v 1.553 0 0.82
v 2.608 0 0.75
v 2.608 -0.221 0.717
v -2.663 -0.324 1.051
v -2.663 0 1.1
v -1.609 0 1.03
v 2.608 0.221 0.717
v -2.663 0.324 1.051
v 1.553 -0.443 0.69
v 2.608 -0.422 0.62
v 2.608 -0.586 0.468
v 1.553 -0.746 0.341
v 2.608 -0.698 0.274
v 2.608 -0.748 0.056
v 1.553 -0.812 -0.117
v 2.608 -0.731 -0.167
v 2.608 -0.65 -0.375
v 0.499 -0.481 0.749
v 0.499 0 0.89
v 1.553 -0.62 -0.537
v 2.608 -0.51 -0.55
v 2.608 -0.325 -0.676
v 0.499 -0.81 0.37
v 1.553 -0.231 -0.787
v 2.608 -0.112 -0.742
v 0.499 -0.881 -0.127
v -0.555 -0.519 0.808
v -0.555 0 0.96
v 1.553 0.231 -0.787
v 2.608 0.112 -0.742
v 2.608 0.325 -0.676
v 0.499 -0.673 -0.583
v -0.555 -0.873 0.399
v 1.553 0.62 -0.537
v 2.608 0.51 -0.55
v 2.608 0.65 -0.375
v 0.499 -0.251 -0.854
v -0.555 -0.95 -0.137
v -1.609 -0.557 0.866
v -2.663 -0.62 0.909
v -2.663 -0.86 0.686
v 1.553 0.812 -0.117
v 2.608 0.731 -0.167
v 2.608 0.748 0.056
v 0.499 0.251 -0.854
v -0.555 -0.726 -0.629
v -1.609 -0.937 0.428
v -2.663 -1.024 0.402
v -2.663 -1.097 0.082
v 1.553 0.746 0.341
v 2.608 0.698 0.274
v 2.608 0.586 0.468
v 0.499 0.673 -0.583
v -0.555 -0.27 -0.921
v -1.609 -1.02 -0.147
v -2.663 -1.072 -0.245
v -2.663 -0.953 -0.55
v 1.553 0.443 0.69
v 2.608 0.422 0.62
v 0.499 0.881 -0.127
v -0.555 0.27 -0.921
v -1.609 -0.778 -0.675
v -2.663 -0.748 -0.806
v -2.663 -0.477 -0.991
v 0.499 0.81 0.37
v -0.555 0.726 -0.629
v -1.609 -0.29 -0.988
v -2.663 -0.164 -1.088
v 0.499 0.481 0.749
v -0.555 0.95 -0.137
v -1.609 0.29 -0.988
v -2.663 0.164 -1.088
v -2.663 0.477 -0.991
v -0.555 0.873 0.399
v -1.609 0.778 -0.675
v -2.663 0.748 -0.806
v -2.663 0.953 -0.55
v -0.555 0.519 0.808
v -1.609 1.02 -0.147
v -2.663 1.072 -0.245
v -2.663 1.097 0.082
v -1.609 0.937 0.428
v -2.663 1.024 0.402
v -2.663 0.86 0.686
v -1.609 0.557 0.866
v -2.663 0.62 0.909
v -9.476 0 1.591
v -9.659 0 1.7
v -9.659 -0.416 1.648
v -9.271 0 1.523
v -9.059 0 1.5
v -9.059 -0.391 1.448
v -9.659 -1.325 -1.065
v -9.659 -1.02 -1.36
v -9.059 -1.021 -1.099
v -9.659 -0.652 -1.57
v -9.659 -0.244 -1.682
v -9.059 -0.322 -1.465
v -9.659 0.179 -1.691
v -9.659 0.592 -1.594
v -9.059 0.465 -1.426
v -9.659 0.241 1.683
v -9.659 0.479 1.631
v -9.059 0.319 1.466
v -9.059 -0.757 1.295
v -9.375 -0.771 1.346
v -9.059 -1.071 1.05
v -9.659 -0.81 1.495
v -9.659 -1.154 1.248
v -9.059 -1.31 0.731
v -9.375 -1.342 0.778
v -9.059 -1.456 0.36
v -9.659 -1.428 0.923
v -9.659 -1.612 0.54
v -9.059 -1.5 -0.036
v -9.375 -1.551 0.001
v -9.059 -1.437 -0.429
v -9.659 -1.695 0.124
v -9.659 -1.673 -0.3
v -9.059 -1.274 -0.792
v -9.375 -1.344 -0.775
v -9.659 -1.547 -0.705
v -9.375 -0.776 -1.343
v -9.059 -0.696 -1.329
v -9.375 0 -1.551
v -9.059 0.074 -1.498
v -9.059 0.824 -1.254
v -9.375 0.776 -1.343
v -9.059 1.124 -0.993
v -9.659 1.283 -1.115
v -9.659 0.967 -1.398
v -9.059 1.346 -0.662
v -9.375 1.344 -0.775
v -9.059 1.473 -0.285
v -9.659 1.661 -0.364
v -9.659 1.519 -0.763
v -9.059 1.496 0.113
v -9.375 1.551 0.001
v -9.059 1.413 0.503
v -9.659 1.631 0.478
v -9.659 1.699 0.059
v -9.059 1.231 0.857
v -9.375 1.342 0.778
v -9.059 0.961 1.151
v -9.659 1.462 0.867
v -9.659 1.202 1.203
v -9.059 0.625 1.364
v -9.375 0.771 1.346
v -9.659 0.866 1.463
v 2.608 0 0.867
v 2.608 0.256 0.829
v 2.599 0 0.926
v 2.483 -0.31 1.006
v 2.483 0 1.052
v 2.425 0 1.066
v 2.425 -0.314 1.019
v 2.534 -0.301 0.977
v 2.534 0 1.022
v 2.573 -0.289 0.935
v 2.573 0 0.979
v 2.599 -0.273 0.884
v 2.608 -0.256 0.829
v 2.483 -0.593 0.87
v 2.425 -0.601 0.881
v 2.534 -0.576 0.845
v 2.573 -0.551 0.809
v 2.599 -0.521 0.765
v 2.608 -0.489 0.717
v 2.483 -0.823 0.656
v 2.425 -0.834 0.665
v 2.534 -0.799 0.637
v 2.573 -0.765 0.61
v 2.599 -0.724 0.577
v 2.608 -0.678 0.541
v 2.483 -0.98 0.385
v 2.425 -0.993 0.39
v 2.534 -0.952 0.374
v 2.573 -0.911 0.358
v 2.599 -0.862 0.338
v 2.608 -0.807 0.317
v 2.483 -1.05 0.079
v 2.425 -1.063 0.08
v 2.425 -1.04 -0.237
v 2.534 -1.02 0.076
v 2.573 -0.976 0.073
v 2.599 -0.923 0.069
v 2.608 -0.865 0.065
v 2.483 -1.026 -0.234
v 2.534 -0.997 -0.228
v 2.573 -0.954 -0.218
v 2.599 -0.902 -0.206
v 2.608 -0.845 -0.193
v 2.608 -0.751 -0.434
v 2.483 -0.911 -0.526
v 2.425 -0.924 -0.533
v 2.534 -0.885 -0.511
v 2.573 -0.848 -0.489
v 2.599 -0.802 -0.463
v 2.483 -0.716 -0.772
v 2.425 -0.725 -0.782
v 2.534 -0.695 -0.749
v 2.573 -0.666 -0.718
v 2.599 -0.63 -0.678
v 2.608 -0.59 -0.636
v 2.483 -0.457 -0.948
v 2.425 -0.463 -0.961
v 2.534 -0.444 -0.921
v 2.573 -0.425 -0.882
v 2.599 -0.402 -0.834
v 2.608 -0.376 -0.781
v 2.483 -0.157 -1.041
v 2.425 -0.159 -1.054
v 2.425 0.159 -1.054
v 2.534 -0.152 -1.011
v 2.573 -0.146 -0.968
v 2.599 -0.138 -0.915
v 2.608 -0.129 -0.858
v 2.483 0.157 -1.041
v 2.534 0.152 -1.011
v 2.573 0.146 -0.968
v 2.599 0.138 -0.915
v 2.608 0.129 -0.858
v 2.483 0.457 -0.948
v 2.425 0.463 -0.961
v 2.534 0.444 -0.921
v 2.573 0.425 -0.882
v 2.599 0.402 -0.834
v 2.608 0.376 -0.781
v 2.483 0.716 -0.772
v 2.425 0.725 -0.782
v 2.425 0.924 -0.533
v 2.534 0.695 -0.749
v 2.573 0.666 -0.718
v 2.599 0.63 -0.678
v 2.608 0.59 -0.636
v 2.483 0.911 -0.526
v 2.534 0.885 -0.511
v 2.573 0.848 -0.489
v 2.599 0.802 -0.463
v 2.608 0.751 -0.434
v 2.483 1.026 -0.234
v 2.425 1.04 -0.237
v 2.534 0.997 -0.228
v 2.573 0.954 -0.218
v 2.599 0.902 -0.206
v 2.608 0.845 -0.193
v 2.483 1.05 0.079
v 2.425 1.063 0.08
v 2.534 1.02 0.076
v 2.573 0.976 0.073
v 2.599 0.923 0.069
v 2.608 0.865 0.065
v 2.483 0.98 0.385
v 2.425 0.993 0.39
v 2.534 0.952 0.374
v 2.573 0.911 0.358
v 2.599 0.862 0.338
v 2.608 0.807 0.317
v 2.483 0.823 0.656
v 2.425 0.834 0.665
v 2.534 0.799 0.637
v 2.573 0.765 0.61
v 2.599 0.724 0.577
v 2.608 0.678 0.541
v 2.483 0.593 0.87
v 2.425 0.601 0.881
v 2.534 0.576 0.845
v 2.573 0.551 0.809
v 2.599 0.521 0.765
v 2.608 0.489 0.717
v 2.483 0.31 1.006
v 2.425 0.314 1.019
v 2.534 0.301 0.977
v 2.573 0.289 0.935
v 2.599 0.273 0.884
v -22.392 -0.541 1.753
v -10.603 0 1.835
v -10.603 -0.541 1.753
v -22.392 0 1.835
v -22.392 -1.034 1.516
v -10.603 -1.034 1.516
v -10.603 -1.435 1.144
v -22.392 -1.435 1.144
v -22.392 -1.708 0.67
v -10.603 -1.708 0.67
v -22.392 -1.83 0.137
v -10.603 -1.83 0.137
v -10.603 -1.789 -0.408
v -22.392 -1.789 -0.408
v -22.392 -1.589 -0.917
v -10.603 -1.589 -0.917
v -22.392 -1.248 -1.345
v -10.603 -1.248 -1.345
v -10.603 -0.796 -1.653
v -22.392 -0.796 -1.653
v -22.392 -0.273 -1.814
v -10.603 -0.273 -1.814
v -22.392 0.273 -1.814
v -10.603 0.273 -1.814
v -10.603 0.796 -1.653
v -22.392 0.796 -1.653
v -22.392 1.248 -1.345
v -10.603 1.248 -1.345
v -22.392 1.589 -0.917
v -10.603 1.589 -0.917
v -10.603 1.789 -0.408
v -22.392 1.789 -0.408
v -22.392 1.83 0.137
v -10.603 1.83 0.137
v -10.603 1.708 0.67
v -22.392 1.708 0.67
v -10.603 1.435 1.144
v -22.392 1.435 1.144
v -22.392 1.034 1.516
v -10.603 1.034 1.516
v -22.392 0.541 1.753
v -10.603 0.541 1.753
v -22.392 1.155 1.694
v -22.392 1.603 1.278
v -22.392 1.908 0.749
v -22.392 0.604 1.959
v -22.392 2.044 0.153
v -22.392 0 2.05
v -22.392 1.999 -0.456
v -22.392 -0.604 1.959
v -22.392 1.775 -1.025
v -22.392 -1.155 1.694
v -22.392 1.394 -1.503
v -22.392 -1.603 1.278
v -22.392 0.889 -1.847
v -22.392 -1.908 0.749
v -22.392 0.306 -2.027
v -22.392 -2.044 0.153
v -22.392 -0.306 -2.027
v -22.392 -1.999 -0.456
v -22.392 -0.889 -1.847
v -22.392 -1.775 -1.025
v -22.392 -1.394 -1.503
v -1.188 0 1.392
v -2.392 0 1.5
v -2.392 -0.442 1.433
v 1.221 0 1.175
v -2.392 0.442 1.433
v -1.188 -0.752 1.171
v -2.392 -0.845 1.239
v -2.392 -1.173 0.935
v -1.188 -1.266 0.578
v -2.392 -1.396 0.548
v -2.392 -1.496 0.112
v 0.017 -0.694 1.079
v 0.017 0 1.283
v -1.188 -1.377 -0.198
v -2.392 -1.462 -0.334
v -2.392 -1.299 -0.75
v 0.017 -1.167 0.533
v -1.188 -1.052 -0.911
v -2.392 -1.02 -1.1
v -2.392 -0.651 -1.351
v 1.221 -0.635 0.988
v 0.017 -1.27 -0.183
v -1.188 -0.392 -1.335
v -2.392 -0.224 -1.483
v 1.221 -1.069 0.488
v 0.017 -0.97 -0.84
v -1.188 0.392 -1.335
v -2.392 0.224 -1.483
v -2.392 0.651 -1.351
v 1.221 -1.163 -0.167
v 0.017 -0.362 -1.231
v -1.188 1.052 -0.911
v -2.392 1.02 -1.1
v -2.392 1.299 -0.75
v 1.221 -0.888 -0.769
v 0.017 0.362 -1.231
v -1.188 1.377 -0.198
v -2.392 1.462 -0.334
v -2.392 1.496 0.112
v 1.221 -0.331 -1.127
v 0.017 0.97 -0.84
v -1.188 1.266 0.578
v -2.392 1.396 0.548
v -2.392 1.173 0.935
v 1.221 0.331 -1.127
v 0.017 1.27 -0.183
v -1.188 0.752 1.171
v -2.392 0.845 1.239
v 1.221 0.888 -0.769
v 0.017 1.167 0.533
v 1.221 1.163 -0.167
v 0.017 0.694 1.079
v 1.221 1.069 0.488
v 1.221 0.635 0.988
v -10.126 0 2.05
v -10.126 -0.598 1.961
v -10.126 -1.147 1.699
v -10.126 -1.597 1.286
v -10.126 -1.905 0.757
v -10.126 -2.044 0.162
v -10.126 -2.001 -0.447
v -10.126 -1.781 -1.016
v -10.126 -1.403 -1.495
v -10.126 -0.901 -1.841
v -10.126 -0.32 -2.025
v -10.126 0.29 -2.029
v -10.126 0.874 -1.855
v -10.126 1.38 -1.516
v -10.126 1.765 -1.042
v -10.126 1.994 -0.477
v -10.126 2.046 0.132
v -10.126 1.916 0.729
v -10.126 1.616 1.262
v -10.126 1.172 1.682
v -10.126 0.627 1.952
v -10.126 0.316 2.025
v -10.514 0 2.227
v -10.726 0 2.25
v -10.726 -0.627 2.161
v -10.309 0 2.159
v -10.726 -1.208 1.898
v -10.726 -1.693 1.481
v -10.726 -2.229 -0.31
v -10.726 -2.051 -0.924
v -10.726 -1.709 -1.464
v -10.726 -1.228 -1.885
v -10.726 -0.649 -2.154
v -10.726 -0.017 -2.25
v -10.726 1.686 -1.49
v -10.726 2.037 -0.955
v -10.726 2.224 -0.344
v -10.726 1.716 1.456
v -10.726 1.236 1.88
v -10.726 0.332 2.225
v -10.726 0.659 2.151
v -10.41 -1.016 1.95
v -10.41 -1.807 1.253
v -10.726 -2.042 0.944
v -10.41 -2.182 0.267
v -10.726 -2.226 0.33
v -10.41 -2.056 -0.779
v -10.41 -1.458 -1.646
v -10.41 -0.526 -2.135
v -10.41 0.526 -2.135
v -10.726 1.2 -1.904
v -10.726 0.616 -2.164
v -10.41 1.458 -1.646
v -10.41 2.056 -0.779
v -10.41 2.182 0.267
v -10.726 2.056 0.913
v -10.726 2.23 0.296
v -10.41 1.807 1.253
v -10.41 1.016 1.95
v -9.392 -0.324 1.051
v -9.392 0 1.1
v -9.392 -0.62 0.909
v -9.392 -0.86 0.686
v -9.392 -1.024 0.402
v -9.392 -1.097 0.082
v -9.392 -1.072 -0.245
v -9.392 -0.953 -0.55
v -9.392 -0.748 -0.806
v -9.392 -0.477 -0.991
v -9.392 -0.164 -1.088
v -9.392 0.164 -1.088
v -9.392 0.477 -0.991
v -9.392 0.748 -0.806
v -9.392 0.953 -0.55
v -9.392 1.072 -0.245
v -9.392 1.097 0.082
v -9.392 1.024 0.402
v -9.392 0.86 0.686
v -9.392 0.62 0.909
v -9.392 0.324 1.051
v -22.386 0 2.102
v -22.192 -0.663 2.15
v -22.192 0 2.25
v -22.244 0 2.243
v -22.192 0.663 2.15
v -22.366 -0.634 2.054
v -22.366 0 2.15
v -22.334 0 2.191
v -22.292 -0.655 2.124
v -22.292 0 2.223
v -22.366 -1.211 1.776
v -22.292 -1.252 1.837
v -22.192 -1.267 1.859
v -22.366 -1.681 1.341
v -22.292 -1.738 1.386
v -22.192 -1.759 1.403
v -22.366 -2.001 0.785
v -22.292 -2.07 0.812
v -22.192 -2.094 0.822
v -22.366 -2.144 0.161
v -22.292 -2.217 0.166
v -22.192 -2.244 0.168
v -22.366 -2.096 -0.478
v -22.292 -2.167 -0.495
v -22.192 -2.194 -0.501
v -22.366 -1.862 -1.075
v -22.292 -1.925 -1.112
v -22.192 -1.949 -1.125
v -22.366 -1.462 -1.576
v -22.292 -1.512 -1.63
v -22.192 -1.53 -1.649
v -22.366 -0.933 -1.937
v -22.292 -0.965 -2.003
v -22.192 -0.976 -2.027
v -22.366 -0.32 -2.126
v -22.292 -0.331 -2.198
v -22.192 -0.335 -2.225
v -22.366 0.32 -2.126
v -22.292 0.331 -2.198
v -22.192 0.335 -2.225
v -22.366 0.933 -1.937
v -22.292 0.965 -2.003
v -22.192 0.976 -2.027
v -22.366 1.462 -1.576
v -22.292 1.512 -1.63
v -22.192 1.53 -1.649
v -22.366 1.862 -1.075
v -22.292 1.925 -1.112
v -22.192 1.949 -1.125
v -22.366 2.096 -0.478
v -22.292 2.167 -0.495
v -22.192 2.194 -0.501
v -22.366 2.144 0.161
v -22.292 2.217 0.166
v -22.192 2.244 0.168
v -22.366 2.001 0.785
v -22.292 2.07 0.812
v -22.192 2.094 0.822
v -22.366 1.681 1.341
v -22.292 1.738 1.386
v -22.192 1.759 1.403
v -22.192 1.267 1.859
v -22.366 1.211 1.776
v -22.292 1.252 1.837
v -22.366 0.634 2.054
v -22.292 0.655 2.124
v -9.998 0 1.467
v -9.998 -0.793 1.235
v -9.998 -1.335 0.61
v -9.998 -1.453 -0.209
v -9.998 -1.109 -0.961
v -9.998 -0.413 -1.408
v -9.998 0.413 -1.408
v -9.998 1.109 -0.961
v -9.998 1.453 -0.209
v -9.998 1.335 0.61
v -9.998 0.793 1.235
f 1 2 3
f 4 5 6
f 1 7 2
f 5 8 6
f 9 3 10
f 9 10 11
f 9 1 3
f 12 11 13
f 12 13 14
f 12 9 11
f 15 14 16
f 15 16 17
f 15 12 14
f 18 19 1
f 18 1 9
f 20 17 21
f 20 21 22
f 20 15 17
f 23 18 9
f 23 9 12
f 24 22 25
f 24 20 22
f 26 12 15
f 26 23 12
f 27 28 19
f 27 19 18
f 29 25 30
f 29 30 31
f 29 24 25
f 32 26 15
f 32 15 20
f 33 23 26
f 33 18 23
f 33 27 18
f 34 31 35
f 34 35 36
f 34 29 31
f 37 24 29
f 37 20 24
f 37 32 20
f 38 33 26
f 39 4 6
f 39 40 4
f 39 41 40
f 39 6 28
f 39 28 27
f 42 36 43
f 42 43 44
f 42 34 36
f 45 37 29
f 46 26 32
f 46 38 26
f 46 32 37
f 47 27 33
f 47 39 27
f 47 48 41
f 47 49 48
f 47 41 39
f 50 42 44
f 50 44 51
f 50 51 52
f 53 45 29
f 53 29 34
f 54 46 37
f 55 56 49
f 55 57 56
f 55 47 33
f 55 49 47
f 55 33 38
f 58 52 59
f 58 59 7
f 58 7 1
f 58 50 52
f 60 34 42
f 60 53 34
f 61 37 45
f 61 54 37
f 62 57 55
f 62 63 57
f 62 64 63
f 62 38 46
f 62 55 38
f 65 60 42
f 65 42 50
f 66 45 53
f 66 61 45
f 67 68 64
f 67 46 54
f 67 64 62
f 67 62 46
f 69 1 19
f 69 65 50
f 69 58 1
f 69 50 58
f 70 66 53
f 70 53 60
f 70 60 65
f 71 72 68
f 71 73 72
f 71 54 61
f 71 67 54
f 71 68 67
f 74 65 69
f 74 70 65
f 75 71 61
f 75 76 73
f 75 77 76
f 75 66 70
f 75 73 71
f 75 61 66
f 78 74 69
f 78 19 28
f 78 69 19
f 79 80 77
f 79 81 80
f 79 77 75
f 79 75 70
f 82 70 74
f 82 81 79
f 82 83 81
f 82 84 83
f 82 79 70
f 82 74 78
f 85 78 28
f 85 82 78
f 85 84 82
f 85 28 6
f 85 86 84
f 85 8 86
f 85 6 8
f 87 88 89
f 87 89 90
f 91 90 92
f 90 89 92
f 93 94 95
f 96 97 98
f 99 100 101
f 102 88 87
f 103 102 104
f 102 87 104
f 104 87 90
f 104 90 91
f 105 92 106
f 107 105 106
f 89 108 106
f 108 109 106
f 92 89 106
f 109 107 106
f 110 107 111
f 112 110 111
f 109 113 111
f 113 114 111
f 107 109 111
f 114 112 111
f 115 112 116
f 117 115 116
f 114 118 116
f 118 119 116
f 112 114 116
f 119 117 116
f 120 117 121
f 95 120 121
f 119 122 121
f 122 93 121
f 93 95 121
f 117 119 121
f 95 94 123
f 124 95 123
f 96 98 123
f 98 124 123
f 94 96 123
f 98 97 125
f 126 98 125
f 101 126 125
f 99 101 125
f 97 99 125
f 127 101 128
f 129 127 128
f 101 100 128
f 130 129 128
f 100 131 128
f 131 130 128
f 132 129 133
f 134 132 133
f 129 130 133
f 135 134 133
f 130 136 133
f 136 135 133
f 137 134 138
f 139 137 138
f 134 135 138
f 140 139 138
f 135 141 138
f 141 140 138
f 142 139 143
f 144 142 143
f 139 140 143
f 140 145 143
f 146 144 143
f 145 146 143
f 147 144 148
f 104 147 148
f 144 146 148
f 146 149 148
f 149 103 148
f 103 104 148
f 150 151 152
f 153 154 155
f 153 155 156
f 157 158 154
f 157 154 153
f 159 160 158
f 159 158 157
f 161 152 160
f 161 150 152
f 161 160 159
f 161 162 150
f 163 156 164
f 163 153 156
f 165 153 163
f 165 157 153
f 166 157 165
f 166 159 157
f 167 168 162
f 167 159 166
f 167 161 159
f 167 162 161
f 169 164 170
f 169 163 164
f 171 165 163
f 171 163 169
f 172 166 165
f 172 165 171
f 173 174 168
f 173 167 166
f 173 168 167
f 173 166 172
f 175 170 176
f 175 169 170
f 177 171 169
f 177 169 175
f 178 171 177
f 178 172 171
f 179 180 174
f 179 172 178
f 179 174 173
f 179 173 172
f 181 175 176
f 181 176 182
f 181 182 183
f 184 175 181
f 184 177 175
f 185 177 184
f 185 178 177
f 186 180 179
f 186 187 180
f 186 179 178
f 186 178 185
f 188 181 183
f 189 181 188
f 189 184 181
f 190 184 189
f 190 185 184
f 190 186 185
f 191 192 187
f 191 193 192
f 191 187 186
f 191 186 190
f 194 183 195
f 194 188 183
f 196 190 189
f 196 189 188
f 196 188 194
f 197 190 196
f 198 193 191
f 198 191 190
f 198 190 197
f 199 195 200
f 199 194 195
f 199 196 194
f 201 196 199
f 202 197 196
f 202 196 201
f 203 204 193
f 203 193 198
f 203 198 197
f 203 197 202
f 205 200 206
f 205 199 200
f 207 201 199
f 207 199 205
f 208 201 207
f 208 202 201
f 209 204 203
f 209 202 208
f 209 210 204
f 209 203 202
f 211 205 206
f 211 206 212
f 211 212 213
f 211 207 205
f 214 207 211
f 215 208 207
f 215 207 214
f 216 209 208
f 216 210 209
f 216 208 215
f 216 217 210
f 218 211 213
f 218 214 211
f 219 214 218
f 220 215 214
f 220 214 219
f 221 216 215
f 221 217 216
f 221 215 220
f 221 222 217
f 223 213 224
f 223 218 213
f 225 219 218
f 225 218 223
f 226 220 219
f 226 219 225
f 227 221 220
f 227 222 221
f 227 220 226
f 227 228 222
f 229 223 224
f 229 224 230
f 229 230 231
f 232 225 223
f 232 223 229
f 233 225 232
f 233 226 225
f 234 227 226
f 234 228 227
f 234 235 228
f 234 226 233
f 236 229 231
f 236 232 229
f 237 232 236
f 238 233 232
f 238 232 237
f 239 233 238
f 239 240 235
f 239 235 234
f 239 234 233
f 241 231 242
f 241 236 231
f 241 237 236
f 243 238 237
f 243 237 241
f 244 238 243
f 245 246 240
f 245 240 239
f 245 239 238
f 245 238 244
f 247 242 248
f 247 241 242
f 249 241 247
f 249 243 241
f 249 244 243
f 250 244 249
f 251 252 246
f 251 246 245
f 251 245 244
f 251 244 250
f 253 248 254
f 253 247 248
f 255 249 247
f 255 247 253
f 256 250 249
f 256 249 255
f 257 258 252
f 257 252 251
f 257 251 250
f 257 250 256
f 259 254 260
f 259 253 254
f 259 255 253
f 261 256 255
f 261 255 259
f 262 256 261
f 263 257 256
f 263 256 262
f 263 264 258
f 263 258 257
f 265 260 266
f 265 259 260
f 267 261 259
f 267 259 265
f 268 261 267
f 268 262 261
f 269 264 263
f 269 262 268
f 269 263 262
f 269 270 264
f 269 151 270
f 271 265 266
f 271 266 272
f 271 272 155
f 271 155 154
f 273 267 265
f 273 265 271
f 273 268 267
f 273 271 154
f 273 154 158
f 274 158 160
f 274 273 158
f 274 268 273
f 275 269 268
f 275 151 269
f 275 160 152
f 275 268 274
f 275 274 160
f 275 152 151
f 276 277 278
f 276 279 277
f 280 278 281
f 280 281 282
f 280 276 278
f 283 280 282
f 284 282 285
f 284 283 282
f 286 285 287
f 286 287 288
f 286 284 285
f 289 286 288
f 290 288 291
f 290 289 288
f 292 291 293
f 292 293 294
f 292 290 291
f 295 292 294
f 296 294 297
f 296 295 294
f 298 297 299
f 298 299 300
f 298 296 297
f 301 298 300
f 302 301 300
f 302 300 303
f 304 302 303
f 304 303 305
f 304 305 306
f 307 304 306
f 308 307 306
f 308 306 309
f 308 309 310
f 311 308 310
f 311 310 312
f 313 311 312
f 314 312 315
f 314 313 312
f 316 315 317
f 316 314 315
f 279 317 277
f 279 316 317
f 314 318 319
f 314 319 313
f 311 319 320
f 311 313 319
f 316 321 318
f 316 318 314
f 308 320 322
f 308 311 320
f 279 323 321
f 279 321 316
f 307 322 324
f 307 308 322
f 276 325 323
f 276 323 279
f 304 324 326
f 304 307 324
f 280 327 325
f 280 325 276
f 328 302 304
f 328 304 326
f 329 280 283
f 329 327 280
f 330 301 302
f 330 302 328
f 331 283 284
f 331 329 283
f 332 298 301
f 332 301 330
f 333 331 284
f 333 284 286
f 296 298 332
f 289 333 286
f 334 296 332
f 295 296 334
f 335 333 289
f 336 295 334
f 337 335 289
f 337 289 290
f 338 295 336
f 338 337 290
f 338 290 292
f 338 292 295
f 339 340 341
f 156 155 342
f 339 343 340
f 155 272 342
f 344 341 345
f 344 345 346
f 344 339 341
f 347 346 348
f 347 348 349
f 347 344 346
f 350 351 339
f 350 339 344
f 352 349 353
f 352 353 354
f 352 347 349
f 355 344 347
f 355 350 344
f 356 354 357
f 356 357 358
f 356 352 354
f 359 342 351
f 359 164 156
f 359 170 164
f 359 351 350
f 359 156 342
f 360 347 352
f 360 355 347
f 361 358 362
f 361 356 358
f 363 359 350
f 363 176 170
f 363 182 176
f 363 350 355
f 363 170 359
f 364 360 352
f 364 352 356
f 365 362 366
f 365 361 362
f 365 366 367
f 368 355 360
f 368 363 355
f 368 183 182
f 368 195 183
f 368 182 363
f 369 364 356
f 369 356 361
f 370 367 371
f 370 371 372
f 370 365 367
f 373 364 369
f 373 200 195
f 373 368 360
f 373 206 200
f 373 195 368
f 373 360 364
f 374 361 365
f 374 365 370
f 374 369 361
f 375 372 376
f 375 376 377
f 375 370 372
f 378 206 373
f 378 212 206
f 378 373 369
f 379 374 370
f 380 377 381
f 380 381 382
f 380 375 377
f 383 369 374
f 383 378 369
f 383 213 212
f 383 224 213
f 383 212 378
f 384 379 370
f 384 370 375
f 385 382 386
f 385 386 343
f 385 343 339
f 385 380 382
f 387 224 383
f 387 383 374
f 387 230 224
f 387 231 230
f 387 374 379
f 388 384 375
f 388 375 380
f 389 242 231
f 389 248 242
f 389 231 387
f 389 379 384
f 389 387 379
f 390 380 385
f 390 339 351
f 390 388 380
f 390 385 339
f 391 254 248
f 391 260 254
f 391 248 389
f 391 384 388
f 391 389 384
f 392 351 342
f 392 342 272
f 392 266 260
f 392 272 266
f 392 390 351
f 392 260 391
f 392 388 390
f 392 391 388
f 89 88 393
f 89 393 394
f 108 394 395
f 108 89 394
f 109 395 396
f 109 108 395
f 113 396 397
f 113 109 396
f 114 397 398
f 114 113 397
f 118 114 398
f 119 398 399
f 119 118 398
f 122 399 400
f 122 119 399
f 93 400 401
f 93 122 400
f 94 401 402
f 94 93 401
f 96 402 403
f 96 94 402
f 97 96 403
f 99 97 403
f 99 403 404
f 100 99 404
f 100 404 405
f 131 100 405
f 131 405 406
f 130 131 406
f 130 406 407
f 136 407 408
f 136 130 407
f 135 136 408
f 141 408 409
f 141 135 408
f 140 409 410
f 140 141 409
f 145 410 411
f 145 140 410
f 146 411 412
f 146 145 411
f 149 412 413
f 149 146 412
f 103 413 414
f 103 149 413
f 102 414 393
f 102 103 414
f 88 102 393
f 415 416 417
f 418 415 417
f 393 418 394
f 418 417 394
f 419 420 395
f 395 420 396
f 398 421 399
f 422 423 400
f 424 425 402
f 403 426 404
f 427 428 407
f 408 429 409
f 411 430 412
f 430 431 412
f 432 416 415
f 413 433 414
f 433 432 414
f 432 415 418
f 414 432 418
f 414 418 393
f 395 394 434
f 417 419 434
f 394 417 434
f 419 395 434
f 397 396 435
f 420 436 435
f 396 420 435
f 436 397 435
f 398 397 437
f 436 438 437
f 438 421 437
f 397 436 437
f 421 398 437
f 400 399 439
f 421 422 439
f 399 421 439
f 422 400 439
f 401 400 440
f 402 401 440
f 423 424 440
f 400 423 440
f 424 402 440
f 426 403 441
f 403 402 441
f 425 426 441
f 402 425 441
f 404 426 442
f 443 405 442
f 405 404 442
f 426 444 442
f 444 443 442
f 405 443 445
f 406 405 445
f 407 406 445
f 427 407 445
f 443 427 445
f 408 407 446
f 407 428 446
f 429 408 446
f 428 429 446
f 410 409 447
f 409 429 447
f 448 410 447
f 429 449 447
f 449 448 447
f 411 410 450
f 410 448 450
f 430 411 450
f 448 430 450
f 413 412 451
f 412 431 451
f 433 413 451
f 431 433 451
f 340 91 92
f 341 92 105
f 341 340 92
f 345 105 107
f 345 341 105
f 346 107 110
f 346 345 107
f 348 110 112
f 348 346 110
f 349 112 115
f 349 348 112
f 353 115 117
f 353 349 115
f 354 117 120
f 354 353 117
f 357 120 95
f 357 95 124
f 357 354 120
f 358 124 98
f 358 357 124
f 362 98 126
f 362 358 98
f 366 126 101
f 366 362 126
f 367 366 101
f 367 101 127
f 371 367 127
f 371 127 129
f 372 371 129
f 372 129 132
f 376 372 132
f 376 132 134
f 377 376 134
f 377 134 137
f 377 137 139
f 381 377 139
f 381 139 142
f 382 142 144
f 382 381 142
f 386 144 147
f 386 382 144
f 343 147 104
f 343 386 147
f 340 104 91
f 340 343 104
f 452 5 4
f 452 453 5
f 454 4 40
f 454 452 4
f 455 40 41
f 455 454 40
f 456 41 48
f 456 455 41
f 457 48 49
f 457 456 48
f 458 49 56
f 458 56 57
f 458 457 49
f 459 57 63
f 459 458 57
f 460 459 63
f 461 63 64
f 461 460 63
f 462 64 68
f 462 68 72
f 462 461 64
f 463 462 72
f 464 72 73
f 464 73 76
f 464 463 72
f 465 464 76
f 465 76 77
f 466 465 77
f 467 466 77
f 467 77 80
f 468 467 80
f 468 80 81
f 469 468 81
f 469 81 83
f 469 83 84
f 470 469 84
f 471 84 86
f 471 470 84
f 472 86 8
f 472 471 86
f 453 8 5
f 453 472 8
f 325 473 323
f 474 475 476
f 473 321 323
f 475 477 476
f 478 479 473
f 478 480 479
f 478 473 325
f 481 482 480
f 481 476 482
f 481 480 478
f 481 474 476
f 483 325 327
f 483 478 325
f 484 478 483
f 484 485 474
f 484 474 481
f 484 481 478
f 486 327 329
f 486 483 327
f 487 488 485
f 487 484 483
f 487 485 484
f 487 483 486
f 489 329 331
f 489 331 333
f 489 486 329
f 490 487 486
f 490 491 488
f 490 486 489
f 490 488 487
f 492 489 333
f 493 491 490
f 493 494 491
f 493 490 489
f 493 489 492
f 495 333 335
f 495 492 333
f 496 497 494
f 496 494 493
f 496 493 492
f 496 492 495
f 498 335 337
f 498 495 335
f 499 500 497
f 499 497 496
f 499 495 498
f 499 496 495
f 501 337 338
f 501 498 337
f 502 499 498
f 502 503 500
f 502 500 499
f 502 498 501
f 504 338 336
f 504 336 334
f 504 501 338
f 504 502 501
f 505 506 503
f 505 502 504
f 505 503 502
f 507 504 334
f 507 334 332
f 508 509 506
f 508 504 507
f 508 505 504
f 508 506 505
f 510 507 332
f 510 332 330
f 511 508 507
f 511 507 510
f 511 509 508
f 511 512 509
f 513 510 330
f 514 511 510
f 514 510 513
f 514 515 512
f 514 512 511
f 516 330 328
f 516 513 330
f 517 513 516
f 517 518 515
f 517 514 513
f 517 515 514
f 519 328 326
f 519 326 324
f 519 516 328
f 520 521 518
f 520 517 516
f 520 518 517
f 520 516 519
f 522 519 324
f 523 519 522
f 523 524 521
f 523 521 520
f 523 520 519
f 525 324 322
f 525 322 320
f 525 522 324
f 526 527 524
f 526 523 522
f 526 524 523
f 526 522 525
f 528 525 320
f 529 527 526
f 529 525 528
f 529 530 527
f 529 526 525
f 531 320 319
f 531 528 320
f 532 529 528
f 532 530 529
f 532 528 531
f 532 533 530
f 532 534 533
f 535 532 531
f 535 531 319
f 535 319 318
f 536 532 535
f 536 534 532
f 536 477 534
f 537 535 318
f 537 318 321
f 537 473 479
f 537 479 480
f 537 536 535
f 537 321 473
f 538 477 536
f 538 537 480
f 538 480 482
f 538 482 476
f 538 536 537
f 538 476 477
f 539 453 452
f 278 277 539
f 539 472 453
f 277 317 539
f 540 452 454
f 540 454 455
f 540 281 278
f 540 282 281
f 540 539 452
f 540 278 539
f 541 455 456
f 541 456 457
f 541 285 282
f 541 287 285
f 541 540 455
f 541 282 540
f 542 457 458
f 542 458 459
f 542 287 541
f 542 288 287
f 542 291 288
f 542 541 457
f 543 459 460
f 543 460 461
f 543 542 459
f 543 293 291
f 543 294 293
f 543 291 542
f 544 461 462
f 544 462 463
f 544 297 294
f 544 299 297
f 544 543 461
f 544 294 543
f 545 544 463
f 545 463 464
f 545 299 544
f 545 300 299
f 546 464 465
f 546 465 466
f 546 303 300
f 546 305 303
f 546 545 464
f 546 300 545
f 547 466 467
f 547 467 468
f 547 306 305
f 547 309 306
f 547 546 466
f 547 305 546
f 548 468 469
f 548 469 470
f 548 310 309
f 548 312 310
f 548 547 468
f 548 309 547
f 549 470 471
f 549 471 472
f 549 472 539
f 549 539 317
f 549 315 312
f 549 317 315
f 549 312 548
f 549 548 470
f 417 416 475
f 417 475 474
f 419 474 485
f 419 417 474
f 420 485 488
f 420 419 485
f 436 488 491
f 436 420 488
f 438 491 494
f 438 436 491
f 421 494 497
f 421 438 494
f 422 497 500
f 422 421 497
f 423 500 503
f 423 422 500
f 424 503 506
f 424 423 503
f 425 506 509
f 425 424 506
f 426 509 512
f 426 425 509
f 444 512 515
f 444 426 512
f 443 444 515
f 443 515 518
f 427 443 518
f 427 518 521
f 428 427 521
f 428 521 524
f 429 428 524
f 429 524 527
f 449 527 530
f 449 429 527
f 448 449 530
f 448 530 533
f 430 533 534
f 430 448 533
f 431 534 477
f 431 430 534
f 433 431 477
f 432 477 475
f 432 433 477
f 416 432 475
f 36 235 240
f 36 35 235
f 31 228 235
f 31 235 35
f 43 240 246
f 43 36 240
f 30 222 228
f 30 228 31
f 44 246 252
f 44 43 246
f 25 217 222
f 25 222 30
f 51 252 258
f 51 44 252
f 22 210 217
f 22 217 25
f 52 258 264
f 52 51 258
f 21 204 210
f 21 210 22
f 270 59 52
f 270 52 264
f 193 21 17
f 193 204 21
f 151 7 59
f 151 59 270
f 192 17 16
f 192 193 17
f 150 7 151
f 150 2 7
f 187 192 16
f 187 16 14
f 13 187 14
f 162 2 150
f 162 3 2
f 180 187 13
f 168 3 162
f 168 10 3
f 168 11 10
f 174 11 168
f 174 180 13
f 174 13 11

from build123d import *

# Parameters (mm, degrees)
FILLET_4_R = 0.2
FILLET_5_R = 1


with BuildPart() as part:
    # Эскиз1 → Повернуть1 (revolve)
    with BuildSketch(Plane.XY, mode=Mode.PRIVATE) as revolve_1_sk:
        Polygon((-22.392450879, 1.834990157), (-22.392450879, 2.25), (-10.392450879, 2.25), (-9.392450879, 1.5), (-2.392450879, 1.5), (2.607549121, 1.05), (2.607549121, 0.75), (-2.663312046, 1.1), (-9.392450879, 1.1), (-10.602717789, 1.834990157), align=None)
    revolve(revolve_1_sk.sketch.rotate(Axis((-52.441675284, 0, 0), (1, 0, 0)), 90), axis=Axis((-52.441675284, 0, 0), (1, 0, 0)))

    # Скругление4
    fillet_4_edges = [part.edges().sort_by_distance(p)[0] for p in [
        (-22.392450879, 0, -2.25),
        (2.607549121, 0, -1.05),
    ]]
    fillet(fillet_4_edges, radius=FILLET_4_R)

    # Скругление5
    fillet_5_edges = [part.edges().sort_by_distance(p)[0] for p in [
        (-10.392450879, 0, -2.25),
        (-9.392450879, 0, -1.5),
    ]]
    fillet(fillet_5_edges, radius=FILLET_5_R)


solid = part.part
